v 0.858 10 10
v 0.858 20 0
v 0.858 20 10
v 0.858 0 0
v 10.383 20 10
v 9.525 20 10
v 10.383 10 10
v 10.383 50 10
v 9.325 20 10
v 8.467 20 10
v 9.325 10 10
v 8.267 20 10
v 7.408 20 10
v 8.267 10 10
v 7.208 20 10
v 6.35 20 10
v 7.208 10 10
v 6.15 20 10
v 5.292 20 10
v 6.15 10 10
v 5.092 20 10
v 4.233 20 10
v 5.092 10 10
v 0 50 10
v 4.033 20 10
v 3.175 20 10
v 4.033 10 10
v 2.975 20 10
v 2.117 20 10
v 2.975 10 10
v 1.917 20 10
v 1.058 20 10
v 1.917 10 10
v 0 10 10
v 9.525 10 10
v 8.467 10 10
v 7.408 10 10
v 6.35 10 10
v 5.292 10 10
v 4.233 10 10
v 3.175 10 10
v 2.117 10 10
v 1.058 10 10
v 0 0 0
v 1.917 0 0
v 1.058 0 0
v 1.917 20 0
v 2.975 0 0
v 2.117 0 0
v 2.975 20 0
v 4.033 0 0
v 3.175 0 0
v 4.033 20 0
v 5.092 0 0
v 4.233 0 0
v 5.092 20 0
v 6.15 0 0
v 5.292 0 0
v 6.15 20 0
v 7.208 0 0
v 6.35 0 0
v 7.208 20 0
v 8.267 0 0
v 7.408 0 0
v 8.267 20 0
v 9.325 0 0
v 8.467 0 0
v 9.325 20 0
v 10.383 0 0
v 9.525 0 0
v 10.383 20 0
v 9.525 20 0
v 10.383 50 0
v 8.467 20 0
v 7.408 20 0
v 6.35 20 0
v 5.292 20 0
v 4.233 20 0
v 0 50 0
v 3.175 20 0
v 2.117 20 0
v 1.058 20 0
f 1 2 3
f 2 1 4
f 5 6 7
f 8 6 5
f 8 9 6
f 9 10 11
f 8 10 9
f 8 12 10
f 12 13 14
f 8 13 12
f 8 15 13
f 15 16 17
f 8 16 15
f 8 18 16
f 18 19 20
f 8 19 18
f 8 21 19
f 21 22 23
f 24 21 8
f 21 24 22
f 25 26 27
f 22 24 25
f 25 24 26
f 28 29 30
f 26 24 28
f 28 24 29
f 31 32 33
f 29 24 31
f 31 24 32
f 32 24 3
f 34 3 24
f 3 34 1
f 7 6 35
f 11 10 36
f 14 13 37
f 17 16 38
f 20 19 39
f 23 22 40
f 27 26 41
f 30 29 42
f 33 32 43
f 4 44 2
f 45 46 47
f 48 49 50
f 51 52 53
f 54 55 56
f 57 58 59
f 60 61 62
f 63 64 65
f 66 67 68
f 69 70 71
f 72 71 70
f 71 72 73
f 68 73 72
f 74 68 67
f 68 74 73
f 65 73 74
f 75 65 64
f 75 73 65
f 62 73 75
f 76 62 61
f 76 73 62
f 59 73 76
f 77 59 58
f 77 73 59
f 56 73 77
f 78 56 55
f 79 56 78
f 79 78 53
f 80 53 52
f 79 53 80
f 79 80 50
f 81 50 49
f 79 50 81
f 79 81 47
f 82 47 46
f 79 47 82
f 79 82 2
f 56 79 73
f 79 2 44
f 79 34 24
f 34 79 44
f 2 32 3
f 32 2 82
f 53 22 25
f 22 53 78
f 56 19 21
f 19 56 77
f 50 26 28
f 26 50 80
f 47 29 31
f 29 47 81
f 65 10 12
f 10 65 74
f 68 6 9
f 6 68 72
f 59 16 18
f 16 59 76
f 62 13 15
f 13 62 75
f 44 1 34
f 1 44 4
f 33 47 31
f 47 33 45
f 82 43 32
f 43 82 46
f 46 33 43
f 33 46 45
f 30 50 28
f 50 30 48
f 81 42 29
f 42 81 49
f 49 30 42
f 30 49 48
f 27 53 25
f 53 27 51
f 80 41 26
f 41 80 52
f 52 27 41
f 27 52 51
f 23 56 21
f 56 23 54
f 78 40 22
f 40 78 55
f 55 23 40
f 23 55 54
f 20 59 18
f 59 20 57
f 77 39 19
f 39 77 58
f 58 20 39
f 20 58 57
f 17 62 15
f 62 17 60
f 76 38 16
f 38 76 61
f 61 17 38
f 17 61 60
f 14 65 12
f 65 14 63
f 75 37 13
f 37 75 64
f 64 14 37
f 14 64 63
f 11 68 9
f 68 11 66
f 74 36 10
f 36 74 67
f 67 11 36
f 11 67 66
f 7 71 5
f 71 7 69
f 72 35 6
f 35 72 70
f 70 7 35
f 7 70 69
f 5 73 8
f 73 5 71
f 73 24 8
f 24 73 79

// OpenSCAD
// TO DO: round the edges of the comb so that it's easier to slot into the a/c.


fpi = 24; // fins per inch
fin_spacing = 1/fpi * 2.54 * 10; // fin spacing in mm

fin_width = 0.2; // width of sheet metal (in practice, printer min width

module tooth () {
    difference() {    
        cube([fin_spacing - fin_width, 20, 10]); 
        translate([fin_spacing - fin_width + 0.01,0,0])
            rotate([45,0,0])
            rotate([0,-90,0])
            cube([20, 20, fin_spacing - fin_width + 0.02]);
    }
}

tooth();

for(offset = [0 : fin_spacing : 10]) {
    translate([offset,0,0]) tooth();
}

translate([0,20,0]) cube([10*fin_spacing - fin_width,30,10]);
